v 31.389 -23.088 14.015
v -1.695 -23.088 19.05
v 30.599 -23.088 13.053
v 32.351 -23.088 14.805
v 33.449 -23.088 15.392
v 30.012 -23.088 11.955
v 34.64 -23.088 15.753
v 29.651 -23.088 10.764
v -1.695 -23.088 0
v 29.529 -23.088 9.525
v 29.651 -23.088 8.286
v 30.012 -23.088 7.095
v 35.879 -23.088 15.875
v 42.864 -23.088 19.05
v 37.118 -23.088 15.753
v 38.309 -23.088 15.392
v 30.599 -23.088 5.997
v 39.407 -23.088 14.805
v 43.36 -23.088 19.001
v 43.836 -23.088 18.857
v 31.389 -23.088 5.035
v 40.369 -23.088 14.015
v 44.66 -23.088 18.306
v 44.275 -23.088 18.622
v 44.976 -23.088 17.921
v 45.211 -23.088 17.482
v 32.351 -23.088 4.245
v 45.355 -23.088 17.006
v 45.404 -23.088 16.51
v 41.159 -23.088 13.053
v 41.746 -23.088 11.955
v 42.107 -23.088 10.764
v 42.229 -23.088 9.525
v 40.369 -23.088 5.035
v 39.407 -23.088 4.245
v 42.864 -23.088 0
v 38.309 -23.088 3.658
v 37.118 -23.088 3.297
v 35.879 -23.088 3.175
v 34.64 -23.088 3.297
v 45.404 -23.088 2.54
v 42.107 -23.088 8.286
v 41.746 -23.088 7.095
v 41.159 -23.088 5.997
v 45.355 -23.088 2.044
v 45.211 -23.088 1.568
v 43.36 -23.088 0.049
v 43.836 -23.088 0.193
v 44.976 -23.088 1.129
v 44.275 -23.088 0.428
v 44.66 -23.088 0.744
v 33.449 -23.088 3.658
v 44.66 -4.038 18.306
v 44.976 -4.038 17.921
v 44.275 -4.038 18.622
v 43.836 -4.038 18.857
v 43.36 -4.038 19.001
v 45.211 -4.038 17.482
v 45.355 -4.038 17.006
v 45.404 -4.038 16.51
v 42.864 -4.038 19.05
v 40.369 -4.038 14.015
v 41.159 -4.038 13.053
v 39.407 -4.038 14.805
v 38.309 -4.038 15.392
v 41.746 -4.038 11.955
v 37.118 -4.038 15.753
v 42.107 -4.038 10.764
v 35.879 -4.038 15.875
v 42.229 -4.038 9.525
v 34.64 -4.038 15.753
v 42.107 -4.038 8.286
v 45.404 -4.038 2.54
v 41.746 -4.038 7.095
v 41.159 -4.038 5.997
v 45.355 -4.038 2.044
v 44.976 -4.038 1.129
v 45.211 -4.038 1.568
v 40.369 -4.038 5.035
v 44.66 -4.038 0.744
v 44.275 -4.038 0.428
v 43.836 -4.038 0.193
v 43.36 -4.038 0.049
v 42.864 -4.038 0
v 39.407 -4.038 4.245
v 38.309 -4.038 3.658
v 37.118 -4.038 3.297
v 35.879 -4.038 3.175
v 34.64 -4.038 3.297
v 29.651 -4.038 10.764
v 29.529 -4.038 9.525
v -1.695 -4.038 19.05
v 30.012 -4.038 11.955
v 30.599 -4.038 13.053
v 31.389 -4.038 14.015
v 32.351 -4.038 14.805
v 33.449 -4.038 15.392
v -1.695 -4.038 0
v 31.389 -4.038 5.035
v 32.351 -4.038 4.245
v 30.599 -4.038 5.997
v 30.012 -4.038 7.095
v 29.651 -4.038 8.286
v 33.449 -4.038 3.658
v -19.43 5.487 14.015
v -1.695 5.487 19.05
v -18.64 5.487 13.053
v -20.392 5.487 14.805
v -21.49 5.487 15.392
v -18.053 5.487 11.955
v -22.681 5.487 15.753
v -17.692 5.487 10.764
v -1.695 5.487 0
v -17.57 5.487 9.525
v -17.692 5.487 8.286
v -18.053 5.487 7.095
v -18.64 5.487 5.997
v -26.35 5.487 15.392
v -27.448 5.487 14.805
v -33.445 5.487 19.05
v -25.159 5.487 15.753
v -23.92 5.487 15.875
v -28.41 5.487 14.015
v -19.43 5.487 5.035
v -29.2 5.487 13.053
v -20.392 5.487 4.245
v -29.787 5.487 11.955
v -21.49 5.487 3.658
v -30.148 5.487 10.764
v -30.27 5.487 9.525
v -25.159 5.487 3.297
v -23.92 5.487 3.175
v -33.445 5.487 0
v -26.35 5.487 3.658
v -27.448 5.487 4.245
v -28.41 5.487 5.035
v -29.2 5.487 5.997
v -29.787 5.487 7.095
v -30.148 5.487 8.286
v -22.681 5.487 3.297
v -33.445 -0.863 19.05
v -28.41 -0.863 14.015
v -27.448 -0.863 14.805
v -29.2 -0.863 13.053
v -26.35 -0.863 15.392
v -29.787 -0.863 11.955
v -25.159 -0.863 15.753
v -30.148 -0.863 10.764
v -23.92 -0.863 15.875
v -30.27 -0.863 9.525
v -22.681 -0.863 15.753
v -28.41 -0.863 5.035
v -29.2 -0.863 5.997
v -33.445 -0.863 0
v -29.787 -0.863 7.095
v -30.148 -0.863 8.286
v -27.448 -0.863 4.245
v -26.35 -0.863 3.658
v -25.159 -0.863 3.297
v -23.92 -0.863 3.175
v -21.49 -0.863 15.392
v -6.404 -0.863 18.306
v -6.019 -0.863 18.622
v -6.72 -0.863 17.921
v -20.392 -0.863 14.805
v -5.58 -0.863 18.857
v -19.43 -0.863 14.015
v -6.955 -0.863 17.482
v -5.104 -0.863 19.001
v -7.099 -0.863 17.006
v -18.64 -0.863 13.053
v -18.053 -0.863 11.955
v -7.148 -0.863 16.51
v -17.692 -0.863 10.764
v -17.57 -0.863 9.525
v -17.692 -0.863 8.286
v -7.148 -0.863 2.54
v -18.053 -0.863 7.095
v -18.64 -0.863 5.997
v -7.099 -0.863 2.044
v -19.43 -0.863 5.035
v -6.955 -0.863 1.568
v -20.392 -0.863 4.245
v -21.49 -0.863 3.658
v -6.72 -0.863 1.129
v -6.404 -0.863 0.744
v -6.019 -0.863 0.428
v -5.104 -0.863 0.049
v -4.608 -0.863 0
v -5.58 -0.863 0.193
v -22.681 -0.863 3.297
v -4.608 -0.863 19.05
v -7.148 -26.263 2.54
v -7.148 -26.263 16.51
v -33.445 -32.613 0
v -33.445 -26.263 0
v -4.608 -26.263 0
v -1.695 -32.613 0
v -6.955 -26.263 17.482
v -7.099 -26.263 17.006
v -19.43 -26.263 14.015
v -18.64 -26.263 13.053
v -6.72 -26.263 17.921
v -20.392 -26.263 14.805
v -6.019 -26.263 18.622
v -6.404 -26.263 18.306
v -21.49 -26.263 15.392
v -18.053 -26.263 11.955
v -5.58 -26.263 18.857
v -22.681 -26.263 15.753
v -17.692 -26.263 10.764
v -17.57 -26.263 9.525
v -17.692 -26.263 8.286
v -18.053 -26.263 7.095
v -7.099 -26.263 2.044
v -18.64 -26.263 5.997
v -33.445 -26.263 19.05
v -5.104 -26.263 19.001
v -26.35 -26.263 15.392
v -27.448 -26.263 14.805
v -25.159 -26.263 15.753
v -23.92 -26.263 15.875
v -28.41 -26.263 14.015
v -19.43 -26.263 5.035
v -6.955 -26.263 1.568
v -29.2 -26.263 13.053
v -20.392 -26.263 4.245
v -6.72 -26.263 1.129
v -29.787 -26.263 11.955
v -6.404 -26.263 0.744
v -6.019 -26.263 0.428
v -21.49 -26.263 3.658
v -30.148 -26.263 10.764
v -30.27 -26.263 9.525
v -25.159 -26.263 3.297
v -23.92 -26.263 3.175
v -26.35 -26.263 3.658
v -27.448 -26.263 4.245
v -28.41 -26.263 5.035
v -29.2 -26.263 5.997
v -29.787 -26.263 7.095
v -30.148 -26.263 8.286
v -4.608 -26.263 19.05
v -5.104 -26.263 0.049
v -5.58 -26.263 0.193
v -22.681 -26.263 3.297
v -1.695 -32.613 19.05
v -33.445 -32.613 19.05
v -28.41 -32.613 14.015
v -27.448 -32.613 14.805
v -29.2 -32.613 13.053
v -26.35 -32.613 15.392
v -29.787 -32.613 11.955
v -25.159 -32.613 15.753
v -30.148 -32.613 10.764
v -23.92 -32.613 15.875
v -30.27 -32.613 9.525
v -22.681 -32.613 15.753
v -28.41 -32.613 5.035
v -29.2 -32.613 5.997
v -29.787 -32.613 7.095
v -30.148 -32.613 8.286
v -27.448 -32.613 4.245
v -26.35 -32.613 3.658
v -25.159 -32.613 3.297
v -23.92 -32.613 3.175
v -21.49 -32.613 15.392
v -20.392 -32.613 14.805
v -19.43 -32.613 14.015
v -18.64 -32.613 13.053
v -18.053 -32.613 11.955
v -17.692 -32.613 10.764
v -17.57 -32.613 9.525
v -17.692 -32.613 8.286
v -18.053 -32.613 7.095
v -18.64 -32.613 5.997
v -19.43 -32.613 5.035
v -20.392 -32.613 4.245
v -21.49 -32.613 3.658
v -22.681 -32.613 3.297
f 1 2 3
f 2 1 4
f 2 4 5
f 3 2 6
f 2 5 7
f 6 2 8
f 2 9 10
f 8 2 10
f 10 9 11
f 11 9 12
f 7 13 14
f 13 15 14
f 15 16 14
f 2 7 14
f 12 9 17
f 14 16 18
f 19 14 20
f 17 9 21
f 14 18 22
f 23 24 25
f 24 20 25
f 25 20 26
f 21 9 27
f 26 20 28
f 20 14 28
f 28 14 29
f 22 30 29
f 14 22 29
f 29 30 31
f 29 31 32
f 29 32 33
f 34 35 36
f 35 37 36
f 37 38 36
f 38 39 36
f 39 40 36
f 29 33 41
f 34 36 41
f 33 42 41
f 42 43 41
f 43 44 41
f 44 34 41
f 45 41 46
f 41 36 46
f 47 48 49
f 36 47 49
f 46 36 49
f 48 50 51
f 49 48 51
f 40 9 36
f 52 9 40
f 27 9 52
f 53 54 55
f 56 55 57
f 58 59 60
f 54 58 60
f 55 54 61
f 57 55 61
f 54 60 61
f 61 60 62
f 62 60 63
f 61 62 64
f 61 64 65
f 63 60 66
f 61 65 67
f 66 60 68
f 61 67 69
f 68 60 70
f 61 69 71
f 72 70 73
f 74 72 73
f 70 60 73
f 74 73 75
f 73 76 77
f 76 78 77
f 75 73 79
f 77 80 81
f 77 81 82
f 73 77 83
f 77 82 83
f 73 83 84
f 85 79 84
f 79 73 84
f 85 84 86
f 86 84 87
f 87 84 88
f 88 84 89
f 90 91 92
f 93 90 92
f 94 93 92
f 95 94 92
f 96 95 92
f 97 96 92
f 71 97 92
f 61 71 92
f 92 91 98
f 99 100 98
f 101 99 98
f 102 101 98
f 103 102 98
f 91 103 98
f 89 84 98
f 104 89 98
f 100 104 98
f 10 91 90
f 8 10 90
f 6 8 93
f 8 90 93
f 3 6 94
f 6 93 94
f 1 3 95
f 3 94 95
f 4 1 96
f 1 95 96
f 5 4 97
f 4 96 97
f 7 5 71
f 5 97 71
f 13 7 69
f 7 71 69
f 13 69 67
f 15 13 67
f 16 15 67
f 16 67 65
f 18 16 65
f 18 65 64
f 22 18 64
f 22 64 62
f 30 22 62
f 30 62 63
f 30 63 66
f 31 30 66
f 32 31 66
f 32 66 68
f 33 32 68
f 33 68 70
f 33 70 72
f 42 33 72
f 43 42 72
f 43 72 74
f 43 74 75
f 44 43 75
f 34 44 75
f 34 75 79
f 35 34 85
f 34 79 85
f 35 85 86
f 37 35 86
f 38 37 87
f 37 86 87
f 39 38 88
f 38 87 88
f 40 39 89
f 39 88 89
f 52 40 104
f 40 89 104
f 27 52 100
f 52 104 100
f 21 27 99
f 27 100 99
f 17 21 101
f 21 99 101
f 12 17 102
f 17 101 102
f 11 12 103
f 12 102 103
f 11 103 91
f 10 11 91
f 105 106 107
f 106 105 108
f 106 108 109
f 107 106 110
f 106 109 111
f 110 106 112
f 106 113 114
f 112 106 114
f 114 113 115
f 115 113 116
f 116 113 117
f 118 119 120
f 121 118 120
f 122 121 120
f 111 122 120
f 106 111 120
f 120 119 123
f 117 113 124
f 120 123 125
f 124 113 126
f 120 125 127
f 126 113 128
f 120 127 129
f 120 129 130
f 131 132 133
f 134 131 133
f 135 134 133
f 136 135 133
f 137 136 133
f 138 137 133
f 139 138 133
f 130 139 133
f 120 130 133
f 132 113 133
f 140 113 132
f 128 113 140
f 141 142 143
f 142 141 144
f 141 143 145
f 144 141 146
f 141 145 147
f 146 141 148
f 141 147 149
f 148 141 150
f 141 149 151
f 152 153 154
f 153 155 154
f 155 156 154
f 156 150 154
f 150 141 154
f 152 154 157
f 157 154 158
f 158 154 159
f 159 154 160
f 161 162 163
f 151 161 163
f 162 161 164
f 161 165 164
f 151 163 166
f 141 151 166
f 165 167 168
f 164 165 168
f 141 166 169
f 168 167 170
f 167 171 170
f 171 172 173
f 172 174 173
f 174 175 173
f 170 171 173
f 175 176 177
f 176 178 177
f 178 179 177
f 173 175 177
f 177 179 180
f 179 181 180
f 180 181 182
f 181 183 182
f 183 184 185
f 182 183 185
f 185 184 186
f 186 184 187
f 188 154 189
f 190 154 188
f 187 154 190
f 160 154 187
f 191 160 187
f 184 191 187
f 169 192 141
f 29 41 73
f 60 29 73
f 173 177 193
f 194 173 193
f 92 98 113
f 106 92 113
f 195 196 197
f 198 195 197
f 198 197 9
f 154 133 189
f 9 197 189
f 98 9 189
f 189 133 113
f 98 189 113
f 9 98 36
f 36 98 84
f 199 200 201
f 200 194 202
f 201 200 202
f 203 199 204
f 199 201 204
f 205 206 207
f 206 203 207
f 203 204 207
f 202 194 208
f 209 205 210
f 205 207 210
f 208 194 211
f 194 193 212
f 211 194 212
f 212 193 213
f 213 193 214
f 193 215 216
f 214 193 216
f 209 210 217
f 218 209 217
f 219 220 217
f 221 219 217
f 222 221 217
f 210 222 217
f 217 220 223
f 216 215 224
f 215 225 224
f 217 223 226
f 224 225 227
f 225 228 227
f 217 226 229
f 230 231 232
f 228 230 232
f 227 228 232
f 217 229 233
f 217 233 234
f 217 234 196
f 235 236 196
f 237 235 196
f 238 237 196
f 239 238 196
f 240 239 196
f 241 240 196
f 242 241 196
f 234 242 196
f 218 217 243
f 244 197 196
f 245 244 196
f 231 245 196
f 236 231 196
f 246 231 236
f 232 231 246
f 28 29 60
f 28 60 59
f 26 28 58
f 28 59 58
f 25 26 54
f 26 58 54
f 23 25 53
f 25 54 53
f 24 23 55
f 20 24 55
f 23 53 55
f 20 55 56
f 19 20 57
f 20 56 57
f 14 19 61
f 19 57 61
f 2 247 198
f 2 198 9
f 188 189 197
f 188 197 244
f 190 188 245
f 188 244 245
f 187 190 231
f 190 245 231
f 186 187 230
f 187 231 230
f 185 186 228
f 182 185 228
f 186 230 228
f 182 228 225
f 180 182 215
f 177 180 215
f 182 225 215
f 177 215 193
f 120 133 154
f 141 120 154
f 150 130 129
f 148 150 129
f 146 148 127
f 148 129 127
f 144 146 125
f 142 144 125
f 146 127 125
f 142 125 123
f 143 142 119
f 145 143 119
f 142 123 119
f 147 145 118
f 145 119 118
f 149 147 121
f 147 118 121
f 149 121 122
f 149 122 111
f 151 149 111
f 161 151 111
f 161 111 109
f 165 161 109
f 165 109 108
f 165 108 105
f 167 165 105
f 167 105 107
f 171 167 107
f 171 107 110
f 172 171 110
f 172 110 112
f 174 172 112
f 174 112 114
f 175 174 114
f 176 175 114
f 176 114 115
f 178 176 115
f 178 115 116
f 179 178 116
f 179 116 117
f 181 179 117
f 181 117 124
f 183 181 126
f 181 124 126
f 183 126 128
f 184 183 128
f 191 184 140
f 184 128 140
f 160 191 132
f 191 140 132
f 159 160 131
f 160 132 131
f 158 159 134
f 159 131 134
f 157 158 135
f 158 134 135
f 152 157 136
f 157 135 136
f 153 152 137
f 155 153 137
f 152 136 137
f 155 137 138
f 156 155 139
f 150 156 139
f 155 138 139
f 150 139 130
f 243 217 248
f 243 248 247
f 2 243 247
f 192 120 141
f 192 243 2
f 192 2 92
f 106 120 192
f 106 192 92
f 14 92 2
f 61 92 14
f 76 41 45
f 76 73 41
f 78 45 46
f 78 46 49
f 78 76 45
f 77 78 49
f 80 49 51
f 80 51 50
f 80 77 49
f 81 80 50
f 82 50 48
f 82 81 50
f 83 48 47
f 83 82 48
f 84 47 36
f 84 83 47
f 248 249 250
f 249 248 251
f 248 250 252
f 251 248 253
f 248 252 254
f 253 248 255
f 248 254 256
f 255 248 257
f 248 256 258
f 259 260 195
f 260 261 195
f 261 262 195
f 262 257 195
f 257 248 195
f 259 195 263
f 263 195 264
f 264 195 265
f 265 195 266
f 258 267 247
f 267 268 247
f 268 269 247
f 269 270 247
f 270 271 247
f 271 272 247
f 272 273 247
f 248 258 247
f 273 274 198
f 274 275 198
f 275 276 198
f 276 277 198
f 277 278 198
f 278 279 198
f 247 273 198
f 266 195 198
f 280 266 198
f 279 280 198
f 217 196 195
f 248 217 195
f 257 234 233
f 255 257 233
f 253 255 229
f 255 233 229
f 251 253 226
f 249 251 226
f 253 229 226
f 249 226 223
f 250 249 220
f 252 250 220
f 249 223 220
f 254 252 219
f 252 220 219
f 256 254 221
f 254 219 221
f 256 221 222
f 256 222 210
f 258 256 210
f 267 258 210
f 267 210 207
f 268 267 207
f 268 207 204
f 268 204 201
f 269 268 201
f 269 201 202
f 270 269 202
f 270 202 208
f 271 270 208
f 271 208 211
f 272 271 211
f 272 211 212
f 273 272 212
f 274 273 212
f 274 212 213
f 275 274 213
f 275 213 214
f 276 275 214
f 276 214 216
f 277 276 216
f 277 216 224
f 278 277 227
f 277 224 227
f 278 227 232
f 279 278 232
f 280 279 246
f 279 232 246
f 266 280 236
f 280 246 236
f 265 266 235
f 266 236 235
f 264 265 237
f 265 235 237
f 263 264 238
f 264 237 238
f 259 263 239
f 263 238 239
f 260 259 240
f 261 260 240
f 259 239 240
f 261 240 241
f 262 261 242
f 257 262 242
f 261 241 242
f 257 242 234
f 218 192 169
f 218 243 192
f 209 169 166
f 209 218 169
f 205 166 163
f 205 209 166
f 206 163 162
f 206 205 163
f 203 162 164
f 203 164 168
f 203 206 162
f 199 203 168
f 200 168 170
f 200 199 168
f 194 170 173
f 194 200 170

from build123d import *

# Parameters (mm, degrees)
F1_DEPTH = 19.05
F3_D     = 12.7
F5_D     = 12.7
F6_R     = 2.54


with BuildPart() as f1:
    # F0 (on Top) → F1 (new body)
    with BuildSketch(Plane.XY):
        Polygon((45.404016, -4.03813), (-1.694917, -4.03813), (-1.694917, 5.48687), (-33.444917, 5.48687), (-33.444917, -0.86313), (-7.148128, -0.86313), (-7.148128, -26.26313), (-33.444917, -26.26313), (-33.444917, -32.61313), (-1.694917, -32.61313), (-1.694917, -23.08813), (45.404016, -23.08813), align=None)
    extrude(amount=F1_DEPTH)

    # F3 (through all)
    with Locations(Plane.XZ.offset(32.61313)):
        with Locations((-23.919917, 9.525)):
            Hole(F3_D / 2)

    # F5 (through all)
    with Locations(Plane.XZ.offset(23.08813)):
        with Locations((35.879016, 9.525)):
            Hole(F5_D / 2)

    # F6
    f6_edges = [f1.edges().sort_by_distance(p)[0] for p in [
        (45.404016, -13.56313, 19.05),
        (45.404016, -13.56313, 0),
        (-7.148128, -13.56313, 19.05),
        (-7.148128, -13.56313, 0),
    ]]
    fillet(f6_edges, radius=F6_R)


solid = f1.part
